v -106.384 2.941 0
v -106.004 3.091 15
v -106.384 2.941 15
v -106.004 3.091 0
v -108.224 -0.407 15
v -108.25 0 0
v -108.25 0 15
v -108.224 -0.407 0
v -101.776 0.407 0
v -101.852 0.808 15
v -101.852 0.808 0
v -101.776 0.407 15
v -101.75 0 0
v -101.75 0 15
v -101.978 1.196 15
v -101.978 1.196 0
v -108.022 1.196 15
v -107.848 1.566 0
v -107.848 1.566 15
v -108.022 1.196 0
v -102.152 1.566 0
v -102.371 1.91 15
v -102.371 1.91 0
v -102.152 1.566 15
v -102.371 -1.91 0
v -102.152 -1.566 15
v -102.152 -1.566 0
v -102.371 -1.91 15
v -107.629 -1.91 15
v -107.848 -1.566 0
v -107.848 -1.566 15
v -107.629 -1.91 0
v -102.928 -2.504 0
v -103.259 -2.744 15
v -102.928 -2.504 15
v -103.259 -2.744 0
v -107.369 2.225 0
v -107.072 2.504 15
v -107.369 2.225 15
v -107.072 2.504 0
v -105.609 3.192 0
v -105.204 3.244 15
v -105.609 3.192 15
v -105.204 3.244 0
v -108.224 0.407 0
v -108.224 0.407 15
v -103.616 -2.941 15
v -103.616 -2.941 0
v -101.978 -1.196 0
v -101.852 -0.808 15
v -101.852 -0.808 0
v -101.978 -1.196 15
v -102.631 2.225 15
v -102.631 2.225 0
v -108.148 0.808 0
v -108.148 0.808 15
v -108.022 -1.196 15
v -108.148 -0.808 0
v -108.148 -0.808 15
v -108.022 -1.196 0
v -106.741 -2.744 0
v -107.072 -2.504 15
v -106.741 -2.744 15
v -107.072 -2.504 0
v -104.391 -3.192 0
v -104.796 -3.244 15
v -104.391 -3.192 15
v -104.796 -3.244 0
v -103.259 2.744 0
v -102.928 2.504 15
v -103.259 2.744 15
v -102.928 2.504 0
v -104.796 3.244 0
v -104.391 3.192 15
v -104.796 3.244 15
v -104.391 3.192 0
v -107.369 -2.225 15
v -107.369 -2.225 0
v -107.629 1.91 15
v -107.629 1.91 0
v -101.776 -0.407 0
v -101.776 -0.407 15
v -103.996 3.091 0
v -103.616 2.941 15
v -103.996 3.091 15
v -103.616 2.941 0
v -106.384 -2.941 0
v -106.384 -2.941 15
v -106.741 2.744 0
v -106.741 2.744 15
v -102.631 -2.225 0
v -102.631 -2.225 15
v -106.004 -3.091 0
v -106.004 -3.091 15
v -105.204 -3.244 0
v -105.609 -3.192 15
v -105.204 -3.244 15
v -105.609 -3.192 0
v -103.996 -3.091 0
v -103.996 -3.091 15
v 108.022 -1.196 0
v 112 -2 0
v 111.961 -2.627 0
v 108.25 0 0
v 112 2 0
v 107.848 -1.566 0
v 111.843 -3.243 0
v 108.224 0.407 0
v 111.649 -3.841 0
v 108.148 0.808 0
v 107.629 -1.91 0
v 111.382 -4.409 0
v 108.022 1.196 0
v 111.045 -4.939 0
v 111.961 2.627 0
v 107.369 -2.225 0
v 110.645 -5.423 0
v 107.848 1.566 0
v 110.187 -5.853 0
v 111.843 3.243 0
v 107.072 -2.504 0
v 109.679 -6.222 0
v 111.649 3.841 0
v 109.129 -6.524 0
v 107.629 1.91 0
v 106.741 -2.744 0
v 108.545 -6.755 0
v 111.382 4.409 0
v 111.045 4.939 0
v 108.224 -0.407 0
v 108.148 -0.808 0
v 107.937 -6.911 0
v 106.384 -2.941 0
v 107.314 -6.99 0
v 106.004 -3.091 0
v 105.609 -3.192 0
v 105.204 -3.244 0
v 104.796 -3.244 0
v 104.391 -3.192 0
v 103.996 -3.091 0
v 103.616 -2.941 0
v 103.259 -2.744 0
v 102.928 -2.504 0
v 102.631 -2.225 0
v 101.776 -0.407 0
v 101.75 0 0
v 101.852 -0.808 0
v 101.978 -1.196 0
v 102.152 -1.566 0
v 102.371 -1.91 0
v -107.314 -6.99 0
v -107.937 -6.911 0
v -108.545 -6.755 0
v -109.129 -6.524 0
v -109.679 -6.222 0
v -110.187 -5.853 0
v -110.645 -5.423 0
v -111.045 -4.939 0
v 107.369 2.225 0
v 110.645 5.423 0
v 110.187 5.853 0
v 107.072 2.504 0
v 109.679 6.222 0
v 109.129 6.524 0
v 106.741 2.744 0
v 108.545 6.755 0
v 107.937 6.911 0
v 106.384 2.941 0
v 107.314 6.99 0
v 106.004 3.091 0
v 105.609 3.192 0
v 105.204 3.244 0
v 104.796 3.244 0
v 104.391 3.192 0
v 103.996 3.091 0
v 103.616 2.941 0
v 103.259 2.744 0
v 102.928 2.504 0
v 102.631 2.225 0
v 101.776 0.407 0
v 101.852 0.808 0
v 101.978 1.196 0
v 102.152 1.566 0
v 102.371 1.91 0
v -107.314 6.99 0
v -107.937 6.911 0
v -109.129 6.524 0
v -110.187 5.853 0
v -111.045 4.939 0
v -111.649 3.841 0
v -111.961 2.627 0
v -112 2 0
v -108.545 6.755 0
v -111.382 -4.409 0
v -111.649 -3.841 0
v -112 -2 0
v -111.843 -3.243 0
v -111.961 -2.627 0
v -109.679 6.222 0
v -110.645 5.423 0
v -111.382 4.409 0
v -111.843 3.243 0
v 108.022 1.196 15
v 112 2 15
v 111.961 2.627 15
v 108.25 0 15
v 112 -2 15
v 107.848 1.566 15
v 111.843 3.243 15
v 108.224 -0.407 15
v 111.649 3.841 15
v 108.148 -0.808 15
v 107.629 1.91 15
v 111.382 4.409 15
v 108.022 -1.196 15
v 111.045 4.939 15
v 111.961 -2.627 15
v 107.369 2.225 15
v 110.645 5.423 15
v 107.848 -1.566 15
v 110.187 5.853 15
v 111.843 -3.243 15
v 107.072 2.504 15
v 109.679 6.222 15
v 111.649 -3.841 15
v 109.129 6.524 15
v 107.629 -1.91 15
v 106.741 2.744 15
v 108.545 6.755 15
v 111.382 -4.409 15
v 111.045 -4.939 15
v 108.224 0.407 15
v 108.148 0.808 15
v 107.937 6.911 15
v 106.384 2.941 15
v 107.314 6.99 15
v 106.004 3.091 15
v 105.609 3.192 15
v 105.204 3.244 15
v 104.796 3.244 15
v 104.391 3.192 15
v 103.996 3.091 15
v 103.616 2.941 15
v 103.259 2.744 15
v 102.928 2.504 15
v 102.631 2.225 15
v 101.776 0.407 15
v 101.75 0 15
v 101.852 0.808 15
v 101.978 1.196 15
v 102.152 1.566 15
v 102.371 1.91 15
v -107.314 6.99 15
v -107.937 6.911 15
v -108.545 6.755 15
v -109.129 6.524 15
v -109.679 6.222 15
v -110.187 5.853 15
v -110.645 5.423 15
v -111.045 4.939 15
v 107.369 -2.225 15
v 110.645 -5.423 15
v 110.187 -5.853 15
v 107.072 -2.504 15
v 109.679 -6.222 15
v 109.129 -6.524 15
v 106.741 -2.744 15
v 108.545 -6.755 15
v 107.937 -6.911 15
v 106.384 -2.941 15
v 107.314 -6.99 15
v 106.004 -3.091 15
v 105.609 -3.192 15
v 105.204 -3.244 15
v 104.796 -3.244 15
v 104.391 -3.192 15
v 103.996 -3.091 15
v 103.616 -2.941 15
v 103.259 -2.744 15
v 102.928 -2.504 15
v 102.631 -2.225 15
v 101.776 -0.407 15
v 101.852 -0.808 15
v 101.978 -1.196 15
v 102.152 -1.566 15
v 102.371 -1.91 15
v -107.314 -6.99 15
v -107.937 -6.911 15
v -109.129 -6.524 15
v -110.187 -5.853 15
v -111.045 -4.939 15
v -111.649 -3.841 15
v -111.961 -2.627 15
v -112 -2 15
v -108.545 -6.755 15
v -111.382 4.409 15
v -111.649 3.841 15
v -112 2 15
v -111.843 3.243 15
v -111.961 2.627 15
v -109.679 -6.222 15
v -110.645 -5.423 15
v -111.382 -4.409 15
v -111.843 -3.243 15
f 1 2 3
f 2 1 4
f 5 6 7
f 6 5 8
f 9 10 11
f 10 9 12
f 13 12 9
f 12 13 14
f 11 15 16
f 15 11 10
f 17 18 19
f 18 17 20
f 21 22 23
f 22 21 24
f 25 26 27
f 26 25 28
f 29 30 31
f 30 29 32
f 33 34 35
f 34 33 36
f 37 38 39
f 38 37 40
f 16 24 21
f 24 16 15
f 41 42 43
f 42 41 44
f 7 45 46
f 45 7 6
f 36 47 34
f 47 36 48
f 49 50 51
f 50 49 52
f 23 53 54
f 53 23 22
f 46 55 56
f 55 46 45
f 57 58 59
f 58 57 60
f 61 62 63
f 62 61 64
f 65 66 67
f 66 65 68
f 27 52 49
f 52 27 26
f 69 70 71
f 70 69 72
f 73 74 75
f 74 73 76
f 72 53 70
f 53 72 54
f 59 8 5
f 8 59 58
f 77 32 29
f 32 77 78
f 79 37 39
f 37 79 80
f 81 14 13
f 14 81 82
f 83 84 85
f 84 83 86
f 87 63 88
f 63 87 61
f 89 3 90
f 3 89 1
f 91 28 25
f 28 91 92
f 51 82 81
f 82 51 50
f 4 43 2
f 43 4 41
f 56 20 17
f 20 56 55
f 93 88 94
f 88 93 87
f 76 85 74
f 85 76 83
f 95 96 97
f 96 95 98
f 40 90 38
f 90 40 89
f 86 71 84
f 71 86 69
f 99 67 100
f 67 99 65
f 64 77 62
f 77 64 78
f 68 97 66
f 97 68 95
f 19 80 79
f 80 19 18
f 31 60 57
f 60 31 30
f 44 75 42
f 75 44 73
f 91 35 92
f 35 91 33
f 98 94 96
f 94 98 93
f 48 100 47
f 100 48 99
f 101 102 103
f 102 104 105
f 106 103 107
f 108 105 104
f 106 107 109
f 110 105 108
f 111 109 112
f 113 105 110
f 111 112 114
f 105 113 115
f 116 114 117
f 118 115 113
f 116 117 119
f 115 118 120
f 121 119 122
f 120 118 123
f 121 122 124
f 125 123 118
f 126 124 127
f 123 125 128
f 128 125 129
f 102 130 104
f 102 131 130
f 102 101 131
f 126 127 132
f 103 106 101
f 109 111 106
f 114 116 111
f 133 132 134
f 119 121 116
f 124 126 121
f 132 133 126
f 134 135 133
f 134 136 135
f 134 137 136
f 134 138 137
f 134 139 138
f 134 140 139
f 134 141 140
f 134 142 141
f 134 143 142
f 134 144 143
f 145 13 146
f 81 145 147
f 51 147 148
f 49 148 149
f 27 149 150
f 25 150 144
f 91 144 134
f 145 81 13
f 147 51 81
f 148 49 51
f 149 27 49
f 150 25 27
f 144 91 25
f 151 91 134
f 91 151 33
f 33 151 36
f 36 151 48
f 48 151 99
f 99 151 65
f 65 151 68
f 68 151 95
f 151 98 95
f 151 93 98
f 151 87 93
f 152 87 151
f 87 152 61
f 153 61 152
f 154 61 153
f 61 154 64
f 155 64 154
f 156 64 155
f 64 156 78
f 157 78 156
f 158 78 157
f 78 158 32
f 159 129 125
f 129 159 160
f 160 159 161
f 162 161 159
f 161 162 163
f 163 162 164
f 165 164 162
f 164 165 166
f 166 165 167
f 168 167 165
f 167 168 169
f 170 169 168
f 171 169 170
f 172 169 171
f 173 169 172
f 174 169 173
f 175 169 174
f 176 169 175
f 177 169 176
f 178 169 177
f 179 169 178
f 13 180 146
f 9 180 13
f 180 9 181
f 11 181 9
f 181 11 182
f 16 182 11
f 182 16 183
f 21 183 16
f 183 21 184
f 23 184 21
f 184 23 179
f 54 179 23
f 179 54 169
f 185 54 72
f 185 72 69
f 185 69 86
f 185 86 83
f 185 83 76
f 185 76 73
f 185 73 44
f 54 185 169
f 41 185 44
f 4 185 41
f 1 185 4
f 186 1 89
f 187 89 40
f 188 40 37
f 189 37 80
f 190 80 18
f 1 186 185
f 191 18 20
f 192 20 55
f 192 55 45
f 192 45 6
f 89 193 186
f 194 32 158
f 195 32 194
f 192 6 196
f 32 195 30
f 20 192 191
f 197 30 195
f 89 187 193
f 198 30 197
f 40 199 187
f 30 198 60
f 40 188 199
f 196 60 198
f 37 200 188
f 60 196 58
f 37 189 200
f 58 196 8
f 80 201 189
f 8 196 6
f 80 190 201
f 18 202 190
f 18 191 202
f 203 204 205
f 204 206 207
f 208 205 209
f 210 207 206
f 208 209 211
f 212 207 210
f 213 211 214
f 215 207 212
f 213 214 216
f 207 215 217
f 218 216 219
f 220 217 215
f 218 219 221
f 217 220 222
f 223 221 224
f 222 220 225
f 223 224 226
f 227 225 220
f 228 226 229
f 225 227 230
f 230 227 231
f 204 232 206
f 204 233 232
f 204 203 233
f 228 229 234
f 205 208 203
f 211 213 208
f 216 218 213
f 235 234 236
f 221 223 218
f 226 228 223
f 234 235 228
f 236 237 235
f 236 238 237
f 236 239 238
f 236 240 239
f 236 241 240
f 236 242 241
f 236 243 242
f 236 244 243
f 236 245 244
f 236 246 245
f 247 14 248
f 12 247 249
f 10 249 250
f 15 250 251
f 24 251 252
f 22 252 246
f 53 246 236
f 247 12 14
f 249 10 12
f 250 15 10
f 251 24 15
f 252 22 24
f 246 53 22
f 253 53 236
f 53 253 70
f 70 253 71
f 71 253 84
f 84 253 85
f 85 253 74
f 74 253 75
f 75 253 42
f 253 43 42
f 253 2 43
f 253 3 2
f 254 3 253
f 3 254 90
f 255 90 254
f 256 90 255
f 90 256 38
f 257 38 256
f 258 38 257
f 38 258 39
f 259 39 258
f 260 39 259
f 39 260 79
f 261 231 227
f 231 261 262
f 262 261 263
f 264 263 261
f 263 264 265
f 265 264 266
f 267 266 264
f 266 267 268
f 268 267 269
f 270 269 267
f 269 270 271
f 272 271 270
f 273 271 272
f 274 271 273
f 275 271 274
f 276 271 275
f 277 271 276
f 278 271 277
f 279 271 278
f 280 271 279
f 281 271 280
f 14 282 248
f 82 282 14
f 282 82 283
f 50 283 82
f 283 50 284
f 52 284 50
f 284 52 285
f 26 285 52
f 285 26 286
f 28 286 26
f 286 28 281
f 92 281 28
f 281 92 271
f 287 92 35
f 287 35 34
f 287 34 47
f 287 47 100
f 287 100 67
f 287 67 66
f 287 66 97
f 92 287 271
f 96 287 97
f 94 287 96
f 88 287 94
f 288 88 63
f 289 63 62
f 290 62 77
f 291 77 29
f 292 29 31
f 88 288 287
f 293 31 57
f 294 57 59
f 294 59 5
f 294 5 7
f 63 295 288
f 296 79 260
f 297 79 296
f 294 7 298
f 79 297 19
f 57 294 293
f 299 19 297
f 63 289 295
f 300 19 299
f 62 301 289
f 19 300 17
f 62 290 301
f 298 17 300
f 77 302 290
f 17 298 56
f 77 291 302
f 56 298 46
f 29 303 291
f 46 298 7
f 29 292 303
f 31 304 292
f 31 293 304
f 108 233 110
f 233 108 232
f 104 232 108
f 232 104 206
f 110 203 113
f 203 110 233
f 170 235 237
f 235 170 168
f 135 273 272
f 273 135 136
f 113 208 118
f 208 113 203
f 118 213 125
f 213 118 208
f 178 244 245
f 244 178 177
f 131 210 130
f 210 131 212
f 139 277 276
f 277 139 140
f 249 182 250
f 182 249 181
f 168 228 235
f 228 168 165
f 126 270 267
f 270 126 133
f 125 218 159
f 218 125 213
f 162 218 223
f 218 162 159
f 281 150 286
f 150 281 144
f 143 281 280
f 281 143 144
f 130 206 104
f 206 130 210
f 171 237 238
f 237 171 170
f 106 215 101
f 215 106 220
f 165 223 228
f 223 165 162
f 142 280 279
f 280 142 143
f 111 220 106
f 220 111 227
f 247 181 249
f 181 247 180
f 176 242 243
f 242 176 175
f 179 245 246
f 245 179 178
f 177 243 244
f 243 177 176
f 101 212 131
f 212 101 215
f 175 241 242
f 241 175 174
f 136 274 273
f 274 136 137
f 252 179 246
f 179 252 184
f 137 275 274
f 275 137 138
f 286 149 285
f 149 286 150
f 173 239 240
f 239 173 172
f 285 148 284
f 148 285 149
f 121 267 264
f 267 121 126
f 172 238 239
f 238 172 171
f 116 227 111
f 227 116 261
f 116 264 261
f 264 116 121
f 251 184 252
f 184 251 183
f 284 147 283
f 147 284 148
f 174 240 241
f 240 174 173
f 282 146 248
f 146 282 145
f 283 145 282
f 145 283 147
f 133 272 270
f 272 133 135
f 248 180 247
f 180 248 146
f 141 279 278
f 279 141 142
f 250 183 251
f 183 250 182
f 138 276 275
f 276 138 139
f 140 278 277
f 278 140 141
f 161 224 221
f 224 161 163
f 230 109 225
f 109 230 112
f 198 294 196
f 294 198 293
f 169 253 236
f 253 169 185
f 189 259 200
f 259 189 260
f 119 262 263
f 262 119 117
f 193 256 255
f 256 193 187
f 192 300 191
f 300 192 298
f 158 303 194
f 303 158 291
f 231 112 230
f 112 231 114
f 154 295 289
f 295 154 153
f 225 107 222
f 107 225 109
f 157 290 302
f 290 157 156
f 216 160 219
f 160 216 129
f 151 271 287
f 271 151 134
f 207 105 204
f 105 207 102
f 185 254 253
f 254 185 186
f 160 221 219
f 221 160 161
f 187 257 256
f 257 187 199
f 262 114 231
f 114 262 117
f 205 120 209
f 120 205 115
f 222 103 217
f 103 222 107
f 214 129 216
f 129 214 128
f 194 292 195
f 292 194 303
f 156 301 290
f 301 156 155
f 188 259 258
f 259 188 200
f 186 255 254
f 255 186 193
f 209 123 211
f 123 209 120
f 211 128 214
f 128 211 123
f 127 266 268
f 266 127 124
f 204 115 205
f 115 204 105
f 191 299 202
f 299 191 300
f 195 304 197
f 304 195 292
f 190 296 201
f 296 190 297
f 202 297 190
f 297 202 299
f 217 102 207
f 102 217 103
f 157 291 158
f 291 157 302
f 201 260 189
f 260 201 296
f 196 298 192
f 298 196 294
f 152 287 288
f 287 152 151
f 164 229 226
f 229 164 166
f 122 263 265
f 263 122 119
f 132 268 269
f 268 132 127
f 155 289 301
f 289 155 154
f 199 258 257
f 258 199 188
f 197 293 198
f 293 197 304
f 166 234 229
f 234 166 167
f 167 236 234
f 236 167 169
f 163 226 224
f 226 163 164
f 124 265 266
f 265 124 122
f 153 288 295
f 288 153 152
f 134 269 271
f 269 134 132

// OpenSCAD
$fn = 50;


difference() {
	union() {
		hull() {
			translate(v = [-107.0000000000, 2.0000000000, 0]) {
				cylinder(h = 15, r = 5);
			}
			translate(v = [107.0000000000, 2.0000000000, 0]) {
				cylinder(h = 15, r = 5);
			}
			translate(v = [-107.0000000000, -2.0000000000, 0]) {
				cylinder(h = 15, r = 5);
			}
			translate(v = [107.0000000000, -2.0000000000, 0]) {
				cylinder(h = 15, r = 5);
			}
		}
	}
	union() {
		translate(v = [-105.0000000000, 0.0000000000, 0]) {
			cylinder(h = 15, r = 3.2500000000);
		}
		translate(v = [105.0000000000, 0.0000000000, 0]) {
			cylinder(h = 15, r = 3.2500000000);
		}
		translate(v = [-105.0000000000, 0.0000000000, 0]) {
			cylinder(h = 15, r = 1.8000000000);
		}
		translate(v = [105.0000000000, 0.0000000000, 0]) {
			cylinder(h = 15, r = 1.8000000000);
		}
		translate(v = [-105.0000000000, 0.0000000000, 0]) {
			cylinder(h = 15, r = 1.8000000000);
		}
		translate(v = [105.0000000000, 0.0000000000, 0]) {
			cylinder(h = 15, r = 1.8000000000);
		}
		translate(v = [-105.0000000000, 0.0000000000, 0]) {
			cylinder(h = 15, r = 1.8000000000);
		}
		translate(v = [105.0000000000, 0.0000000000, 0]) {
			cylinder(h = 15, r = 1.8000000000);
		}
	}
}
